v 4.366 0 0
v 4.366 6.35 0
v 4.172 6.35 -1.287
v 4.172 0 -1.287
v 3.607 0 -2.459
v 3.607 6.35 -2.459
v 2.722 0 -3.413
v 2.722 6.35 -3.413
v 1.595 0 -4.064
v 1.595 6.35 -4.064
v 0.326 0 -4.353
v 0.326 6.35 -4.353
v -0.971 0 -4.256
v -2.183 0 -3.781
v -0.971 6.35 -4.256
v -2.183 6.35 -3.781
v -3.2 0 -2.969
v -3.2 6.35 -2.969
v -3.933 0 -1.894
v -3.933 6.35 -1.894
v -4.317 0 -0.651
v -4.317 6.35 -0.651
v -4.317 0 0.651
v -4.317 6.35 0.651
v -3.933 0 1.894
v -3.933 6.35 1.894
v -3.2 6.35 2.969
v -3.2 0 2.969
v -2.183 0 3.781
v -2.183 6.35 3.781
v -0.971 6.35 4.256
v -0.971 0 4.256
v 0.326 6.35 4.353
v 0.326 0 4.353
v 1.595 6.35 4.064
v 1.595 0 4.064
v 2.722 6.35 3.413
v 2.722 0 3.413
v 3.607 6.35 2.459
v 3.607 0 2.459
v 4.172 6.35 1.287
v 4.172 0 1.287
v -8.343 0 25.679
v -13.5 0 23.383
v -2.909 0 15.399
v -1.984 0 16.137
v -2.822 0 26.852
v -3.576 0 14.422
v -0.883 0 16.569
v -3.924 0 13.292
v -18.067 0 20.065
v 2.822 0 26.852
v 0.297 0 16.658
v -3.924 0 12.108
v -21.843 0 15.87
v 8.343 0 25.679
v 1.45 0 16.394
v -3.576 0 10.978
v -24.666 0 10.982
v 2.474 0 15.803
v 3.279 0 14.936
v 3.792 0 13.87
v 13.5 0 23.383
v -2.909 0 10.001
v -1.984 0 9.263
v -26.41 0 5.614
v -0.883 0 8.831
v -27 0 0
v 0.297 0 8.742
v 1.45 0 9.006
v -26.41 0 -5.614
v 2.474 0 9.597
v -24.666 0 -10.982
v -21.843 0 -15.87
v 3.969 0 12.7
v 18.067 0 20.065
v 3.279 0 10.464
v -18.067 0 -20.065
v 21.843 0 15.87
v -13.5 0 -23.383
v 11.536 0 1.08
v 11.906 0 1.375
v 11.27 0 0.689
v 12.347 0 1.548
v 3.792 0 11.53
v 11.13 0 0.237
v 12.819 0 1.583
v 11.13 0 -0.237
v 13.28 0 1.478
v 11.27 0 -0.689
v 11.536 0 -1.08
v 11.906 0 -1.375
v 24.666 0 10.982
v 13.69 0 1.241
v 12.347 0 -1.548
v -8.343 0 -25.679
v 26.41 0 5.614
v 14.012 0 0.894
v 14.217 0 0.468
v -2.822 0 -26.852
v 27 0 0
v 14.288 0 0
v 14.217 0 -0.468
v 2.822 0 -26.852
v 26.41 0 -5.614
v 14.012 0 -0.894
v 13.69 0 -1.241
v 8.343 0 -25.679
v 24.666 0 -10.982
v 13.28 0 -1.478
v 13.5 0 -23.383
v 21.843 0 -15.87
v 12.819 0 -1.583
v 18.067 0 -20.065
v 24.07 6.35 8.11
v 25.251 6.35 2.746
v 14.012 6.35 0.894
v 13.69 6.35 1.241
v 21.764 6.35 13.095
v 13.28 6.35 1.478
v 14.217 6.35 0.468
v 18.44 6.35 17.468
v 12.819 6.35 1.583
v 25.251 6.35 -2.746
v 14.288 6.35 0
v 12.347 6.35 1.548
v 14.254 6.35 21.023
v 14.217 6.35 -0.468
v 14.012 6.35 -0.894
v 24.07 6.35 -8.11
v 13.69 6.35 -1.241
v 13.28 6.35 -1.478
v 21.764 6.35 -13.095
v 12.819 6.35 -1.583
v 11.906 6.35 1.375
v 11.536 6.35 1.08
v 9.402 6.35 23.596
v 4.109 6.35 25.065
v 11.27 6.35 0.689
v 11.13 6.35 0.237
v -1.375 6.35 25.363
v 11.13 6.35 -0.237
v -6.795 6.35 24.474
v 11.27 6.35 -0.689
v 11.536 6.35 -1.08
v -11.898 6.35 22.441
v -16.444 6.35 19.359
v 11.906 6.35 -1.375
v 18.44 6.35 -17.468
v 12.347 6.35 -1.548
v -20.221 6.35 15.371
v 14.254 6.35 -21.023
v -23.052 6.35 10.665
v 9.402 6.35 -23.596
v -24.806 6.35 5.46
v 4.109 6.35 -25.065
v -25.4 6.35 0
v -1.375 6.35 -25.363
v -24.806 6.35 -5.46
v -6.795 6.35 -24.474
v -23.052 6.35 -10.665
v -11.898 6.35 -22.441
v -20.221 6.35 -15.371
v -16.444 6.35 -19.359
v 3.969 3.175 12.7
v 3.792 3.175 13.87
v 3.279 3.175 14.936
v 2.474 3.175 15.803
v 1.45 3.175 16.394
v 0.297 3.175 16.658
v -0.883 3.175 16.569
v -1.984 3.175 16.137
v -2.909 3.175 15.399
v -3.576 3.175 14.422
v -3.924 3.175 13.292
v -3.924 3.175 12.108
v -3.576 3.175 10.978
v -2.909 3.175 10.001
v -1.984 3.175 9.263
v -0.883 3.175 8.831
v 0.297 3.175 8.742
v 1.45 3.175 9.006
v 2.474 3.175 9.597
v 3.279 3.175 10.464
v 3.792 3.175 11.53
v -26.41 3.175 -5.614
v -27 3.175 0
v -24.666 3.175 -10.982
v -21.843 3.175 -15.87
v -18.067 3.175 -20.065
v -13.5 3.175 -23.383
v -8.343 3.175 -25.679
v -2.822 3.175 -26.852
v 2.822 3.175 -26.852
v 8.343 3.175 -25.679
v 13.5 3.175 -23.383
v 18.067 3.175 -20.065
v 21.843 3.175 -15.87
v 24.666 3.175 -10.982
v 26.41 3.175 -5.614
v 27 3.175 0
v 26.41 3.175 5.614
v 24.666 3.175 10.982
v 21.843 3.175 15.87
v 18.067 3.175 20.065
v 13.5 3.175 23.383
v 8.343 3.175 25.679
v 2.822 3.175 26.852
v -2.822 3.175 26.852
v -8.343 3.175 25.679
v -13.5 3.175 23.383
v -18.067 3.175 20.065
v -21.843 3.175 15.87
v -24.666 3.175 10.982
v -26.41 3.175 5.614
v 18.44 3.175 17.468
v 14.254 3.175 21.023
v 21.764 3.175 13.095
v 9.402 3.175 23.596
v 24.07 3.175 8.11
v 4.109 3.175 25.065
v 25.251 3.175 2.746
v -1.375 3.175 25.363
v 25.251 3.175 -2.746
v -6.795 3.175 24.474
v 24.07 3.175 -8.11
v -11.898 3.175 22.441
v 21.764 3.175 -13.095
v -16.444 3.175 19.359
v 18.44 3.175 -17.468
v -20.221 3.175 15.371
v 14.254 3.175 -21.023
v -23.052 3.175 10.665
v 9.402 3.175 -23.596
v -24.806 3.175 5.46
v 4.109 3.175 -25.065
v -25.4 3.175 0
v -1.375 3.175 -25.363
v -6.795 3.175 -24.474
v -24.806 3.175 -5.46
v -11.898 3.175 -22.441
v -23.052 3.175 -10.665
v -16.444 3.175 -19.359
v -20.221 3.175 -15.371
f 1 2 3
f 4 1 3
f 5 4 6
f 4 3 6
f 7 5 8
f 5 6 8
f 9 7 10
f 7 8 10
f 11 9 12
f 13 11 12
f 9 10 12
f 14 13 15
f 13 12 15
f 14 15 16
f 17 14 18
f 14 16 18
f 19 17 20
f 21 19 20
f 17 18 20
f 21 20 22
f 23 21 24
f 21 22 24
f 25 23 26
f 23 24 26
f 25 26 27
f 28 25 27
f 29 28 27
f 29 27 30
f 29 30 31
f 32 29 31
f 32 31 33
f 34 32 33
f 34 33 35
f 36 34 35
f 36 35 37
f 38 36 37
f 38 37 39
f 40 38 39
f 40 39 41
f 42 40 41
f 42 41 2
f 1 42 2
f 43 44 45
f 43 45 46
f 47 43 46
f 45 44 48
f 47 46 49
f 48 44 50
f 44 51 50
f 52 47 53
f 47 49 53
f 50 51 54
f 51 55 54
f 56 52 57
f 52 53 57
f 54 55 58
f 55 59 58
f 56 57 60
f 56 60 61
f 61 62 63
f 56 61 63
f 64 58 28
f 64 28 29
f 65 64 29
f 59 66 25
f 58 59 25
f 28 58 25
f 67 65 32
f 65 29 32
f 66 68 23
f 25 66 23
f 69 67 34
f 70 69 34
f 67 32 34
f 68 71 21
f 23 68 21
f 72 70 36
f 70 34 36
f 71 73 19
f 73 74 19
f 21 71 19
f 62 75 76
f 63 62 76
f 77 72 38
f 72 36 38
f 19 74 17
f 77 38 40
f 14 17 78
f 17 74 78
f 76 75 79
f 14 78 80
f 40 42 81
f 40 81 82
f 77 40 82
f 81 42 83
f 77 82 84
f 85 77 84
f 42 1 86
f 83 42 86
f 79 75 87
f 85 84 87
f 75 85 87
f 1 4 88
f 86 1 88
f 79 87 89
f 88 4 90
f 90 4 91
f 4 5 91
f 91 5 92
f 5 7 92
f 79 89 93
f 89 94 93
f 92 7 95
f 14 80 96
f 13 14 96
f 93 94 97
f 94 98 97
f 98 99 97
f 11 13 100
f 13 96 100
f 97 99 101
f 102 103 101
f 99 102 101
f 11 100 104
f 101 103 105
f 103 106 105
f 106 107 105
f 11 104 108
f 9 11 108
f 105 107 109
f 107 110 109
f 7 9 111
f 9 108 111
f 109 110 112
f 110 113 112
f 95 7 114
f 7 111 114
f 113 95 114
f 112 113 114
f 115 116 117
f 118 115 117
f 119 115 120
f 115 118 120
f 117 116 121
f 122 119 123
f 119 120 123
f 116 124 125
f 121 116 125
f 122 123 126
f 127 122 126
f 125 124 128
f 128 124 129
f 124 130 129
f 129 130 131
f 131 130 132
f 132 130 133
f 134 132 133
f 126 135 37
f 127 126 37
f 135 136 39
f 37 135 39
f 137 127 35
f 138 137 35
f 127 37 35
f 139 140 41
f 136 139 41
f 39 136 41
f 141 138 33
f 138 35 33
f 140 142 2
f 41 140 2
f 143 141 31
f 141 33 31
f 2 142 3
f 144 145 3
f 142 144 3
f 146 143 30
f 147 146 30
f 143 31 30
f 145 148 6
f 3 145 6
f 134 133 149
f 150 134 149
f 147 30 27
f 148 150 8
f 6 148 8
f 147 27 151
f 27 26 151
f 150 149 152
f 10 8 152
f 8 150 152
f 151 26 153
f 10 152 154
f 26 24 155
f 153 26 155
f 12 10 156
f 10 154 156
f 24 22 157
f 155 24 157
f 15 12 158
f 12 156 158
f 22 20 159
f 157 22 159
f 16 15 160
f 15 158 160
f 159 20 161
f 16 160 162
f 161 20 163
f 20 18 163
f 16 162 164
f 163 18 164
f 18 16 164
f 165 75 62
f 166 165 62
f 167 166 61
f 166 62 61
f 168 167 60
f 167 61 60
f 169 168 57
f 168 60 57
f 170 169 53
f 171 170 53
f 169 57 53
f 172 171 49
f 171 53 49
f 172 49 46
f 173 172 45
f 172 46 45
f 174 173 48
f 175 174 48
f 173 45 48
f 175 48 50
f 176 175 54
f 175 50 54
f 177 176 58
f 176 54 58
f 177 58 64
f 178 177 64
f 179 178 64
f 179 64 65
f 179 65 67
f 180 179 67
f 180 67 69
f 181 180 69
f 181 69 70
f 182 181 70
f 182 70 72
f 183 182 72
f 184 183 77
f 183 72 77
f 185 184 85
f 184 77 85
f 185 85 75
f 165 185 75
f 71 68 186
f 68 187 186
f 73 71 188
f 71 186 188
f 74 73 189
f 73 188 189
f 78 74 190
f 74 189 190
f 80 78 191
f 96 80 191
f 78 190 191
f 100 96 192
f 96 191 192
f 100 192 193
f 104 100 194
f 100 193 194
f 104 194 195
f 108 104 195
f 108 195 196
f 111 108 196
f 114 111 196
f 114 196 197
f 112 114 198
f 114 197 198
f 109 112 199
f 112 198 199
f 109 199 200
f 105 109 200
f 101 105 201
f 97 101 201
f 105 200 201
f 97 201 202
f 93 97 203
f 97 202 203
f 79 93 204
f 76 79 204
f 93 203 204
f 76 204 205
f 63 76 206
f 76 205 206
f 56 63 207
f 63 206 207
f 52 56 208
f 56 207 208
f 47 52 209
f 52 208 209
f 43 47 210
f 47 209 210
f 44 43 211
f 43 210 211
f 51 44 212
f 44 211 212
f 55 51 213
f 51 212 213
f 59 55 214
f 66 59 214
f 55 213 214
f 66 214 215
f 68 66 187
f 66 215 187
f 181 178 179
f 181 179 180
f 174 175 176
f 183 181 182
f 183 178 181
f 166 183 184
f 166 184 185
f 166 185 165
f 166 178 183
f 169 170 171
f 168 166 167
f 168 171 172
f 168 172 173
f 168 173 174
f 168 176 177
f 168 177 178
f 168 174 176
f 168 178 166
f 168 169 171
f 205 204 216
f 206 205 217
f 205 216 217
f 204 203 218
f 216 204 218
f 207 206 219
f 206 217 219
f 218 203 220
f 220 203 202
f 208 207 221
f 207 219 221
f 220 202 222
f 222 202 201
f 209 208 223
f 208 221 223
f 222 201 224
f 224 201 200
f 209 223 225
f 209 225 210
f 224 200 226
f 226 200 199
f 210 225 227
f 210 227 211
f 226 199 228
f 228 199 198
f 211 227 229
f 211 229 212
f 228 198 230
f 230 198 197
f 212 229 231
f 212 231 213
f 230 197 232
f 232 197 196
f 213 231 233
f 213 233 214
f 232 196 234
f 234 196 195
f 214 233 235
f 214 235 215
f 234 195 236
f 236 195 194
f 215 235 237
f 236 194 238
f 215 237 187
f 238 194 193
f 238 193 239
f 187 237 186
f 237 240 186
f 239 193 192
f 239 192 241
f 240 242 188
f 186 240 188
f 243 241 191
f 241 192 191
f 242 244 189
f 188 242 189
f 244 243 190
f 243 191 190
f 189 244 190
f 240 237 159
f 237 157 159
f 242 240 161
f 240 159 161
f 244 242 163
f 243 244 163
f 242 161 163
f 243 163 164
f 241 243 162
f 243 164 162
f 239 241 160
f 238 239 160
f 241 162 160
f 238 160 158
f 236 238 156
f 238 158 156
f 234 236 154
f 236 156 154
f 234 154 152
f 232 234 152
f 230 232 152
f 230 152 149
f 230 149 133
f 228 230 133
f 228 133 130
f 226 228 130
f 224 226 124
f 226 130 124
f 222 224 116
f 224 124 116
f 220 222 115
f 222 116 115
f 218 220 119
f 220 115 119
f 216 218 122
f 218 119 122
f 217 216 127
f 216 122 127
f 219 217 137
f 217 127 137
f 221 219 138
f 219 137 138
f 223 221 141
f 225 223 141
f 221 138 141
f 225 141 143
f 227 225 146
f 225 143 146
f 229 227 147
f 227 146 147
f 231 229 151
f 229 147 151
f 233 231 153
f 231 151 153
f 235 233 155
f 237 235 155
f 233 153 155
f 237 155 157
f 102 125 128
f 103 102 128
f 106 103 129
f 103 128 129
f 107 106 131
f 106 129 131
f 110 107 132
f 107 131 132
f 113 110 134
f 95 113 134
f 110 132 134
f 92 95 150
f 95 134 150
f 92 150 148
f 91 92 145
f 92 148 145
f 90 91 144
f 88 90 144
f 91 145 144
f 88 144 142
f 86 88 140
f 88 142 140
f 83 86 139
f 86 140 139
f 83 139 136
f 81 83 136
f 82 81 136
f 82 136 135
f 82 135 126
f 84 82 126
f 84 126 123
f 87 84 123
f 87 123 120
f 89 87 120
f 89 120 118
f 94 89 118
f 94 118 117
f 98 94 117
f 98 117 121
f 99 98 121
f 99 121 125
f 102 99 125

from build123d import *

# Parameters (mm, degrees)
SKETCH2_R               = 4.365625
SKETCH2_R_2             = 1.5875
CUT_EXTRUDE1_DEPTH      = 1
CUT_EXTRUDE1_DEPTH_BACK = 7.35
SKETCH3_R               = 3.96875
CUT_EXTRUDE2_DEPTH      = 3.175


with BuildPart() as part:
    # Sketch1 → Revolve1 (revolve)
    with BuildSketch(Plane.XY):
        Polygon((0, 0), (-27, 0), (-27, 3.175), (-25.4, 3.175), (-25.4, 6.35), (0, 6.35), align=None)
    revolve(axis=Axis((0, 6.35, 0), (0, -1, 0)))

    # Sketch2 → Cut-Extrude1 (cut, two sides)
    with BuildSketch(Plane(origin=(0, 6.35, 0), x_dir=(1, 0, 0), z_dir=(0, 1, 0))) as cut_extrude1_sk:
        Circle(SKETCH2_R)
        with Locations((12.7, 0)):
            Circle(SKETCH2_R_2)
    extrude(amount=CUT_EXTRUDE1_DEPTH, mode=Mode.SUBTRACT)
    extrude(cut_extrude1_sk.sketch, amount=-CUT_EXTRUDE1_DEPTH_BACK, mode=Mode.SUBTRACT)

    # Sketch3 → Cut-Extrude2 (cut)
    with BuildSketch(Plane.XZ):
        with Locations((0, 12.7)):
            Circle(SKETCH3_R)
    extrude(amount=-CUT_EXTRUDE2_DEPTH, mode=Mode.SUBTRACT)


solid = part.part
